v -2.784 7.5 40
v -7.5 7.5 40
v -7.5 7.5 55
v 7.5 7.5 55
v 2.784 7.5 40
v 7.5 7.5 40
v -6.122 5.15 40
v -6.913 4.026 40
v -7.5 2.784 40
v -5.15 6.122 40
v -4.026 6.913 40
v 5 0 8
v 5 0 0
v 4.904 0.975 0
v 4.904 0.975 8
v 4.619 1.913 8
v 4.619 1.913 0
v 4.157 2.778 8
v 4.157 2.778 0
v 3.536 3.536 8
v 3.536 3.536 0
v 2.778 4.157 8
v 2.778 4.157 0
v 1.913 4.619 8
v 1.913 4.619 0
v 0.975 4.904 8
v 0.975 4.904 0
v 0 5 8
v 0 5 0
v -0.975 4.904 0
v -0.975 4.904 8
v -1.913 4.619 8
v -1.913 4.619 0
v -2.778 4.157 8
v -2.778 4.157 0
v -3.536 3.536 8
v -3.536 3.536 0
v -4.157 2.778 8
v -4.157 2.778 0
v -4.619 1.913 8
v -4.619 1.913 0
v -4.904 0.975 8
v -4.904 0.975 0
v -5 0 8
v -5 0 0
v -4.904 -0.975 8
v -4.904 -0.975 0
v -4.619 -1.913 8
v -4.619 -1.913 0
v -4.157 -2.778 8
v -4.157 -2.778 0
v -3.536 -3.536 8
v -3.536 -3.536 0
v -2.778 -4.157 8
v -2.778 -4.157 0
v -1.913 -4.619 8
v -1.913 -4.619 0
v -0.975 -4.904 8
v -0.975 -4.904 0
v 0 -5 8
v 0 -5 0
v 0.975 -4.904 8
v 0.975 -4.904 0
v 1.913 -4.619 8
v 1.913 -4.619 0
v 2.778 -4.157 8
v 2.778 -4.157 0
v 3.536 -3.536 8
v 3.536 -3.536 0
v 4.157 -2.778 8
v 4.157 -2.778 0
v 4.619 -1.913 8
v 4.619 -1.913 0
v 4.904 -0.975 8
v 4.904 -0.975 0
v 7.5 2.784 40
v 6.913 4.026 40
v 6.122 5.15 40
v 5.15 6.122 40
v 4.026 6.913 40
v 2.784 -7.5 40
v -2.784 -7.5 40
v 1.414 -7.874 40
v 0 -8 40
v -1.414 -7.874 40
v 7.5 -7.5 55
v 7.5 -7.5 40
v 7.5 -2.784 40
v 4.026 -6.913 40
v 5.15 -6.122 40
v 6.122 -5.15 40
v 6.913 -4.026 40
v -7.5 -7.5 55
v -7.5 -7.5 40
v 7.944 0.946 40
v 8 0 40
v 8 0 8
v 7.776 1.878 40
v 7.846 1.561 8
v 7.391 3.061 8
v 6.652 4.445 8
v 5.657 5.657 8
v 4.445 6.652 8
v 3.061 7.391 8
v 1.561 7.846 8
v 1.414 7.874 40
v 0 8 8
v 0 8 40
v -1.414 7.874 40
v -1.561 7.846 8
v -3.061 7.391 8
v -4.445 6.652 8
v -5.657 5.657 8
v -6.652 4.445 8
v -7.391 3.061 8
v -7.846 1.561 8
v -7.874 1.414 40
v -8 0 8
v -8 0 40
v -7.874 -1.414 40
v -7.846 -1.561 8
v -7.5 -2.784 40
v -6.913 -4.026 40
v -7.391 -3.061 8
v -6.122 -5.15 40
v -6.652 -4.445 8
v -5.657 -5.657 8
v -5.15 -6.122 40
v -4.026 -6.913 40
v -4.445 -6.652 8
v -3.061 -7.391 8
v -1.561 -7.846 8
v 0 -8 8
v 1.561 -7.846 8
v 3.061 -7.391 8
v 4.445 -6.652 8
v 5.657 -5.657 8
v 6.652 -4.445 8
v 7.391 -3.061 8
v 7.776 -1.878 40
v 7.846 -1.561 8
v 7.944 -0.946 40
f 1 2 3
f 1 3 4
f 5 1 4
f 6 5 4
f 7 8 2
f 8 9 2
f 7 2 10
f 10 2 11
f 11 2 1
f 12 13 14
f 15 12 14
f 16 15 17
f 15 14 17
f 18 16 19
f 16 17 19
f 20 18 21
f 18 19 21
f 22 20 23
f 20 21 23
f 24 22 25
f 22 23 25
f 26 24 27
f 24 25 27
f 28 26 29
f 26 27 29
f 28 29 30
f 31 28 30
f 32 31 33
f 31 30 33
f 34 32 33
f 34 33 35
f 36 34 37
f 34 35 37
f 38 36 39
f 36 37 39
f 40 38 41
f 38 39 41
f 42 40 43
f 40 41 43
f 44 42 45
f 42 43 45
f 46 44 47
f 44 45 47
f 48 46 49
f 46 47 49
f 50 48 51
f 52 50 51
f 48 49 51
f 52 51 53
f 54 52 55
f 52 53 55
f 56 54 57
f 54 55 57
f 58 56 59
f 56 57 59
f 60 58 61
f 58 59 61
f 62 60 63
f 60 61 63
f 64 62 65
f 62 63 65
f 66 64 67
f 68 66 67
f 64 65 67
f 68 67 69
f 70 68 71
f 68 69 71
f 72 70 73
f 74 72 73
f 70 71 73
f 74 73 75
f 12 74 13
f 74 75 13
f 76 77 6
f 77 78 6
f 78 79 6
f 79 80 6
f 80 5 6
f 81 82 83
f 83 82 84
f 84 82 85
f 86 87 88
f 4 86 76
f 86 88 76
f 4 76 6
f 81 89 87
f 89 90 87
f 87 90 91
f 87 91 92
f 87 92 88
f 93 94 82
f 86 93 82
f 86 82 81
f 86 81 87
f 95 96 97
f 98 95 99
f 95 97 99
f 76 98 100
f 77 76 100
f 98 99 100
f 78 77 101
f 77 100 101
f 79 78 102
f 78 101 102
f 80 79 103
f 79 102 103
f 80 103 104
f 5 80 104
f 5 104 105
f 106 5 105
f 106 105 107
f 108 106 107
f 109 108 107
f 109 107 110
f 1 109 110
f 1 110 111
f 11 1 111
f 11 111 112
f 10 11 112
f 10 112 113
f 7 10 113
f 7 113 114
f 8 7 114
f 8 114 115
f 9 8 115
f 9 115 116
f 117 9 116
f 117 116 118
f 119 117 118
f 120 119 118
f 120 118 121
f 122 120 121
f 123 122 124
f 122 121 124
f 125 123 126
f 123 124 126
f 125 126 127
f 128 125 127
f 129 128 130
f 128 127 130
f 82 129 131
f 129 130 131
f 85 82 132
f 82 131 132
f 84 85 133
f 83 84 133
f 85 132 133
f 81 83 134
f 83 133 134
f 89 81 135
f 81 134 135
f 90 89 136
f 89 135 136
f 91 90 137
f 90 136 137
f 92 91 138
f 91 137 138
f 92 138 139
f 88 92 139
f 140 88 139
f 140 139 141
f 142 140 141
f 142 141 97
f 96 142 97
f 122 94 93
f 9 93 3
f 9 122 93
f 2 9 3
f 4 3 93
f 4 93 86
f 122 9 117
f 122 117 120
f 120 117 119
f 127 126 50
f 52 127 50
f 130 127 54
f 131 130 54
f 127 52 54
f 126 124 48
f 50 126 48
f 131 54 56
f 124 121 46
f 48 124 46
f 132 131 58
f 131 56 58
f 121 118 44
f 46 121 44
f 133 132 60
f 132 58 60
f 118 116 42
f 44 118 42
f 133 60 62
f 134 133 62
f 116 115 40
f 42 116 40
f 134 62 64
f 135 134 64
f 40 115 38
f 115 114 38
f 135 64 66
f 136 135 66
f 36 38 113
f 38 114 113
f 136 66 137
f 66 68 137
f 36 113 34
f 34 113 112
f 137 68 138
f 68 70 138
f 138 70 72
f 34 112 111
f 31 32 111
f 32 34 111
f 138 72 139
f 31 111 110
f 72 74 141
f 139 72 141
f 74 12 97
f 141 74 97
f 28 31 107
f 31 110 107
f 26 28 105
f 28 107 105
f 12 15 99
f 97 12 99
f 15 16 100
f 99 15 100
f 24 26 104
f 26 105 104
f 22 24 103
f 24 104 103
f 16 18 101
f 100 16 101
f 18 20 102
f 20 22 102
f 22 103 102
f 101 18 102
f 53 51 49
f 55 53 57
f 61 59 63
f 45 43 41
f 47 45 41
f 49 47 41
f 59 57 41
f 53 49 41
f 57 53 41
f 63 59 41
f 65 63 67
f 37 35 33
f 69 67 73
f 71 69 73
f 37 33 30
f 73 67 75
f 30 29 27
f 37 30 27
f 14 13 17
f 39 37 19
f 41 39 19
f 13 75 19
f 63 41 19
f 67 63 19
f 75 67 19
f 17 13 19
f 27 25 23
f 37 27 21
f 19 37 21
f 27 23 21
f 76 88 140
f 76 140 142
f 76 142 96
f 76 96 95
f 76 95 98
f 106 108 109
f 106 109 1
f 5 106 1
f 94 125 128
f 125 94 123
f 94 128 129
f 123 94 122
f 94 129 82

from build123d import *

# Parameters (mm, degrees)
SKETCH1_R           = 5
BOSS_EXTRUDE1_DEPTH = 8
SKETCH2_R           = 8
BOSS_EXTRUDE2_DEPTH = 32
SKETCH3_W           = 15
SKETCH3_H           = 15
BOSS_EXTRUDE3_DEPTH = 15


with BuildPart() as part:
    # Sketch1 → Boss-Extrude1 (new body)
    with BuildSketch(Plane.XY):
        Circle(SKETCH1_R)
    extrude(amount=BOSS_EXTRUDE1_DEPTH)

    # Sketch2 → Boss-Extrude2 (add)
    with BuildSketch(Plane.XY.offset(8)):
        Circle(SKETCH2_R)
    extrude(amount=BOSS_EXTRUDE2_DEPTH)

    # Sketch3 → Boss-Extrude3 (add)
    with BuildSketch(Plane.XY.offset(40)):
        Rectangle(SKETCH3_W, SKETCH3_H)
    extrude(amount=BOSS_EXTRUDE3_DEPTH)


solid = part.part
